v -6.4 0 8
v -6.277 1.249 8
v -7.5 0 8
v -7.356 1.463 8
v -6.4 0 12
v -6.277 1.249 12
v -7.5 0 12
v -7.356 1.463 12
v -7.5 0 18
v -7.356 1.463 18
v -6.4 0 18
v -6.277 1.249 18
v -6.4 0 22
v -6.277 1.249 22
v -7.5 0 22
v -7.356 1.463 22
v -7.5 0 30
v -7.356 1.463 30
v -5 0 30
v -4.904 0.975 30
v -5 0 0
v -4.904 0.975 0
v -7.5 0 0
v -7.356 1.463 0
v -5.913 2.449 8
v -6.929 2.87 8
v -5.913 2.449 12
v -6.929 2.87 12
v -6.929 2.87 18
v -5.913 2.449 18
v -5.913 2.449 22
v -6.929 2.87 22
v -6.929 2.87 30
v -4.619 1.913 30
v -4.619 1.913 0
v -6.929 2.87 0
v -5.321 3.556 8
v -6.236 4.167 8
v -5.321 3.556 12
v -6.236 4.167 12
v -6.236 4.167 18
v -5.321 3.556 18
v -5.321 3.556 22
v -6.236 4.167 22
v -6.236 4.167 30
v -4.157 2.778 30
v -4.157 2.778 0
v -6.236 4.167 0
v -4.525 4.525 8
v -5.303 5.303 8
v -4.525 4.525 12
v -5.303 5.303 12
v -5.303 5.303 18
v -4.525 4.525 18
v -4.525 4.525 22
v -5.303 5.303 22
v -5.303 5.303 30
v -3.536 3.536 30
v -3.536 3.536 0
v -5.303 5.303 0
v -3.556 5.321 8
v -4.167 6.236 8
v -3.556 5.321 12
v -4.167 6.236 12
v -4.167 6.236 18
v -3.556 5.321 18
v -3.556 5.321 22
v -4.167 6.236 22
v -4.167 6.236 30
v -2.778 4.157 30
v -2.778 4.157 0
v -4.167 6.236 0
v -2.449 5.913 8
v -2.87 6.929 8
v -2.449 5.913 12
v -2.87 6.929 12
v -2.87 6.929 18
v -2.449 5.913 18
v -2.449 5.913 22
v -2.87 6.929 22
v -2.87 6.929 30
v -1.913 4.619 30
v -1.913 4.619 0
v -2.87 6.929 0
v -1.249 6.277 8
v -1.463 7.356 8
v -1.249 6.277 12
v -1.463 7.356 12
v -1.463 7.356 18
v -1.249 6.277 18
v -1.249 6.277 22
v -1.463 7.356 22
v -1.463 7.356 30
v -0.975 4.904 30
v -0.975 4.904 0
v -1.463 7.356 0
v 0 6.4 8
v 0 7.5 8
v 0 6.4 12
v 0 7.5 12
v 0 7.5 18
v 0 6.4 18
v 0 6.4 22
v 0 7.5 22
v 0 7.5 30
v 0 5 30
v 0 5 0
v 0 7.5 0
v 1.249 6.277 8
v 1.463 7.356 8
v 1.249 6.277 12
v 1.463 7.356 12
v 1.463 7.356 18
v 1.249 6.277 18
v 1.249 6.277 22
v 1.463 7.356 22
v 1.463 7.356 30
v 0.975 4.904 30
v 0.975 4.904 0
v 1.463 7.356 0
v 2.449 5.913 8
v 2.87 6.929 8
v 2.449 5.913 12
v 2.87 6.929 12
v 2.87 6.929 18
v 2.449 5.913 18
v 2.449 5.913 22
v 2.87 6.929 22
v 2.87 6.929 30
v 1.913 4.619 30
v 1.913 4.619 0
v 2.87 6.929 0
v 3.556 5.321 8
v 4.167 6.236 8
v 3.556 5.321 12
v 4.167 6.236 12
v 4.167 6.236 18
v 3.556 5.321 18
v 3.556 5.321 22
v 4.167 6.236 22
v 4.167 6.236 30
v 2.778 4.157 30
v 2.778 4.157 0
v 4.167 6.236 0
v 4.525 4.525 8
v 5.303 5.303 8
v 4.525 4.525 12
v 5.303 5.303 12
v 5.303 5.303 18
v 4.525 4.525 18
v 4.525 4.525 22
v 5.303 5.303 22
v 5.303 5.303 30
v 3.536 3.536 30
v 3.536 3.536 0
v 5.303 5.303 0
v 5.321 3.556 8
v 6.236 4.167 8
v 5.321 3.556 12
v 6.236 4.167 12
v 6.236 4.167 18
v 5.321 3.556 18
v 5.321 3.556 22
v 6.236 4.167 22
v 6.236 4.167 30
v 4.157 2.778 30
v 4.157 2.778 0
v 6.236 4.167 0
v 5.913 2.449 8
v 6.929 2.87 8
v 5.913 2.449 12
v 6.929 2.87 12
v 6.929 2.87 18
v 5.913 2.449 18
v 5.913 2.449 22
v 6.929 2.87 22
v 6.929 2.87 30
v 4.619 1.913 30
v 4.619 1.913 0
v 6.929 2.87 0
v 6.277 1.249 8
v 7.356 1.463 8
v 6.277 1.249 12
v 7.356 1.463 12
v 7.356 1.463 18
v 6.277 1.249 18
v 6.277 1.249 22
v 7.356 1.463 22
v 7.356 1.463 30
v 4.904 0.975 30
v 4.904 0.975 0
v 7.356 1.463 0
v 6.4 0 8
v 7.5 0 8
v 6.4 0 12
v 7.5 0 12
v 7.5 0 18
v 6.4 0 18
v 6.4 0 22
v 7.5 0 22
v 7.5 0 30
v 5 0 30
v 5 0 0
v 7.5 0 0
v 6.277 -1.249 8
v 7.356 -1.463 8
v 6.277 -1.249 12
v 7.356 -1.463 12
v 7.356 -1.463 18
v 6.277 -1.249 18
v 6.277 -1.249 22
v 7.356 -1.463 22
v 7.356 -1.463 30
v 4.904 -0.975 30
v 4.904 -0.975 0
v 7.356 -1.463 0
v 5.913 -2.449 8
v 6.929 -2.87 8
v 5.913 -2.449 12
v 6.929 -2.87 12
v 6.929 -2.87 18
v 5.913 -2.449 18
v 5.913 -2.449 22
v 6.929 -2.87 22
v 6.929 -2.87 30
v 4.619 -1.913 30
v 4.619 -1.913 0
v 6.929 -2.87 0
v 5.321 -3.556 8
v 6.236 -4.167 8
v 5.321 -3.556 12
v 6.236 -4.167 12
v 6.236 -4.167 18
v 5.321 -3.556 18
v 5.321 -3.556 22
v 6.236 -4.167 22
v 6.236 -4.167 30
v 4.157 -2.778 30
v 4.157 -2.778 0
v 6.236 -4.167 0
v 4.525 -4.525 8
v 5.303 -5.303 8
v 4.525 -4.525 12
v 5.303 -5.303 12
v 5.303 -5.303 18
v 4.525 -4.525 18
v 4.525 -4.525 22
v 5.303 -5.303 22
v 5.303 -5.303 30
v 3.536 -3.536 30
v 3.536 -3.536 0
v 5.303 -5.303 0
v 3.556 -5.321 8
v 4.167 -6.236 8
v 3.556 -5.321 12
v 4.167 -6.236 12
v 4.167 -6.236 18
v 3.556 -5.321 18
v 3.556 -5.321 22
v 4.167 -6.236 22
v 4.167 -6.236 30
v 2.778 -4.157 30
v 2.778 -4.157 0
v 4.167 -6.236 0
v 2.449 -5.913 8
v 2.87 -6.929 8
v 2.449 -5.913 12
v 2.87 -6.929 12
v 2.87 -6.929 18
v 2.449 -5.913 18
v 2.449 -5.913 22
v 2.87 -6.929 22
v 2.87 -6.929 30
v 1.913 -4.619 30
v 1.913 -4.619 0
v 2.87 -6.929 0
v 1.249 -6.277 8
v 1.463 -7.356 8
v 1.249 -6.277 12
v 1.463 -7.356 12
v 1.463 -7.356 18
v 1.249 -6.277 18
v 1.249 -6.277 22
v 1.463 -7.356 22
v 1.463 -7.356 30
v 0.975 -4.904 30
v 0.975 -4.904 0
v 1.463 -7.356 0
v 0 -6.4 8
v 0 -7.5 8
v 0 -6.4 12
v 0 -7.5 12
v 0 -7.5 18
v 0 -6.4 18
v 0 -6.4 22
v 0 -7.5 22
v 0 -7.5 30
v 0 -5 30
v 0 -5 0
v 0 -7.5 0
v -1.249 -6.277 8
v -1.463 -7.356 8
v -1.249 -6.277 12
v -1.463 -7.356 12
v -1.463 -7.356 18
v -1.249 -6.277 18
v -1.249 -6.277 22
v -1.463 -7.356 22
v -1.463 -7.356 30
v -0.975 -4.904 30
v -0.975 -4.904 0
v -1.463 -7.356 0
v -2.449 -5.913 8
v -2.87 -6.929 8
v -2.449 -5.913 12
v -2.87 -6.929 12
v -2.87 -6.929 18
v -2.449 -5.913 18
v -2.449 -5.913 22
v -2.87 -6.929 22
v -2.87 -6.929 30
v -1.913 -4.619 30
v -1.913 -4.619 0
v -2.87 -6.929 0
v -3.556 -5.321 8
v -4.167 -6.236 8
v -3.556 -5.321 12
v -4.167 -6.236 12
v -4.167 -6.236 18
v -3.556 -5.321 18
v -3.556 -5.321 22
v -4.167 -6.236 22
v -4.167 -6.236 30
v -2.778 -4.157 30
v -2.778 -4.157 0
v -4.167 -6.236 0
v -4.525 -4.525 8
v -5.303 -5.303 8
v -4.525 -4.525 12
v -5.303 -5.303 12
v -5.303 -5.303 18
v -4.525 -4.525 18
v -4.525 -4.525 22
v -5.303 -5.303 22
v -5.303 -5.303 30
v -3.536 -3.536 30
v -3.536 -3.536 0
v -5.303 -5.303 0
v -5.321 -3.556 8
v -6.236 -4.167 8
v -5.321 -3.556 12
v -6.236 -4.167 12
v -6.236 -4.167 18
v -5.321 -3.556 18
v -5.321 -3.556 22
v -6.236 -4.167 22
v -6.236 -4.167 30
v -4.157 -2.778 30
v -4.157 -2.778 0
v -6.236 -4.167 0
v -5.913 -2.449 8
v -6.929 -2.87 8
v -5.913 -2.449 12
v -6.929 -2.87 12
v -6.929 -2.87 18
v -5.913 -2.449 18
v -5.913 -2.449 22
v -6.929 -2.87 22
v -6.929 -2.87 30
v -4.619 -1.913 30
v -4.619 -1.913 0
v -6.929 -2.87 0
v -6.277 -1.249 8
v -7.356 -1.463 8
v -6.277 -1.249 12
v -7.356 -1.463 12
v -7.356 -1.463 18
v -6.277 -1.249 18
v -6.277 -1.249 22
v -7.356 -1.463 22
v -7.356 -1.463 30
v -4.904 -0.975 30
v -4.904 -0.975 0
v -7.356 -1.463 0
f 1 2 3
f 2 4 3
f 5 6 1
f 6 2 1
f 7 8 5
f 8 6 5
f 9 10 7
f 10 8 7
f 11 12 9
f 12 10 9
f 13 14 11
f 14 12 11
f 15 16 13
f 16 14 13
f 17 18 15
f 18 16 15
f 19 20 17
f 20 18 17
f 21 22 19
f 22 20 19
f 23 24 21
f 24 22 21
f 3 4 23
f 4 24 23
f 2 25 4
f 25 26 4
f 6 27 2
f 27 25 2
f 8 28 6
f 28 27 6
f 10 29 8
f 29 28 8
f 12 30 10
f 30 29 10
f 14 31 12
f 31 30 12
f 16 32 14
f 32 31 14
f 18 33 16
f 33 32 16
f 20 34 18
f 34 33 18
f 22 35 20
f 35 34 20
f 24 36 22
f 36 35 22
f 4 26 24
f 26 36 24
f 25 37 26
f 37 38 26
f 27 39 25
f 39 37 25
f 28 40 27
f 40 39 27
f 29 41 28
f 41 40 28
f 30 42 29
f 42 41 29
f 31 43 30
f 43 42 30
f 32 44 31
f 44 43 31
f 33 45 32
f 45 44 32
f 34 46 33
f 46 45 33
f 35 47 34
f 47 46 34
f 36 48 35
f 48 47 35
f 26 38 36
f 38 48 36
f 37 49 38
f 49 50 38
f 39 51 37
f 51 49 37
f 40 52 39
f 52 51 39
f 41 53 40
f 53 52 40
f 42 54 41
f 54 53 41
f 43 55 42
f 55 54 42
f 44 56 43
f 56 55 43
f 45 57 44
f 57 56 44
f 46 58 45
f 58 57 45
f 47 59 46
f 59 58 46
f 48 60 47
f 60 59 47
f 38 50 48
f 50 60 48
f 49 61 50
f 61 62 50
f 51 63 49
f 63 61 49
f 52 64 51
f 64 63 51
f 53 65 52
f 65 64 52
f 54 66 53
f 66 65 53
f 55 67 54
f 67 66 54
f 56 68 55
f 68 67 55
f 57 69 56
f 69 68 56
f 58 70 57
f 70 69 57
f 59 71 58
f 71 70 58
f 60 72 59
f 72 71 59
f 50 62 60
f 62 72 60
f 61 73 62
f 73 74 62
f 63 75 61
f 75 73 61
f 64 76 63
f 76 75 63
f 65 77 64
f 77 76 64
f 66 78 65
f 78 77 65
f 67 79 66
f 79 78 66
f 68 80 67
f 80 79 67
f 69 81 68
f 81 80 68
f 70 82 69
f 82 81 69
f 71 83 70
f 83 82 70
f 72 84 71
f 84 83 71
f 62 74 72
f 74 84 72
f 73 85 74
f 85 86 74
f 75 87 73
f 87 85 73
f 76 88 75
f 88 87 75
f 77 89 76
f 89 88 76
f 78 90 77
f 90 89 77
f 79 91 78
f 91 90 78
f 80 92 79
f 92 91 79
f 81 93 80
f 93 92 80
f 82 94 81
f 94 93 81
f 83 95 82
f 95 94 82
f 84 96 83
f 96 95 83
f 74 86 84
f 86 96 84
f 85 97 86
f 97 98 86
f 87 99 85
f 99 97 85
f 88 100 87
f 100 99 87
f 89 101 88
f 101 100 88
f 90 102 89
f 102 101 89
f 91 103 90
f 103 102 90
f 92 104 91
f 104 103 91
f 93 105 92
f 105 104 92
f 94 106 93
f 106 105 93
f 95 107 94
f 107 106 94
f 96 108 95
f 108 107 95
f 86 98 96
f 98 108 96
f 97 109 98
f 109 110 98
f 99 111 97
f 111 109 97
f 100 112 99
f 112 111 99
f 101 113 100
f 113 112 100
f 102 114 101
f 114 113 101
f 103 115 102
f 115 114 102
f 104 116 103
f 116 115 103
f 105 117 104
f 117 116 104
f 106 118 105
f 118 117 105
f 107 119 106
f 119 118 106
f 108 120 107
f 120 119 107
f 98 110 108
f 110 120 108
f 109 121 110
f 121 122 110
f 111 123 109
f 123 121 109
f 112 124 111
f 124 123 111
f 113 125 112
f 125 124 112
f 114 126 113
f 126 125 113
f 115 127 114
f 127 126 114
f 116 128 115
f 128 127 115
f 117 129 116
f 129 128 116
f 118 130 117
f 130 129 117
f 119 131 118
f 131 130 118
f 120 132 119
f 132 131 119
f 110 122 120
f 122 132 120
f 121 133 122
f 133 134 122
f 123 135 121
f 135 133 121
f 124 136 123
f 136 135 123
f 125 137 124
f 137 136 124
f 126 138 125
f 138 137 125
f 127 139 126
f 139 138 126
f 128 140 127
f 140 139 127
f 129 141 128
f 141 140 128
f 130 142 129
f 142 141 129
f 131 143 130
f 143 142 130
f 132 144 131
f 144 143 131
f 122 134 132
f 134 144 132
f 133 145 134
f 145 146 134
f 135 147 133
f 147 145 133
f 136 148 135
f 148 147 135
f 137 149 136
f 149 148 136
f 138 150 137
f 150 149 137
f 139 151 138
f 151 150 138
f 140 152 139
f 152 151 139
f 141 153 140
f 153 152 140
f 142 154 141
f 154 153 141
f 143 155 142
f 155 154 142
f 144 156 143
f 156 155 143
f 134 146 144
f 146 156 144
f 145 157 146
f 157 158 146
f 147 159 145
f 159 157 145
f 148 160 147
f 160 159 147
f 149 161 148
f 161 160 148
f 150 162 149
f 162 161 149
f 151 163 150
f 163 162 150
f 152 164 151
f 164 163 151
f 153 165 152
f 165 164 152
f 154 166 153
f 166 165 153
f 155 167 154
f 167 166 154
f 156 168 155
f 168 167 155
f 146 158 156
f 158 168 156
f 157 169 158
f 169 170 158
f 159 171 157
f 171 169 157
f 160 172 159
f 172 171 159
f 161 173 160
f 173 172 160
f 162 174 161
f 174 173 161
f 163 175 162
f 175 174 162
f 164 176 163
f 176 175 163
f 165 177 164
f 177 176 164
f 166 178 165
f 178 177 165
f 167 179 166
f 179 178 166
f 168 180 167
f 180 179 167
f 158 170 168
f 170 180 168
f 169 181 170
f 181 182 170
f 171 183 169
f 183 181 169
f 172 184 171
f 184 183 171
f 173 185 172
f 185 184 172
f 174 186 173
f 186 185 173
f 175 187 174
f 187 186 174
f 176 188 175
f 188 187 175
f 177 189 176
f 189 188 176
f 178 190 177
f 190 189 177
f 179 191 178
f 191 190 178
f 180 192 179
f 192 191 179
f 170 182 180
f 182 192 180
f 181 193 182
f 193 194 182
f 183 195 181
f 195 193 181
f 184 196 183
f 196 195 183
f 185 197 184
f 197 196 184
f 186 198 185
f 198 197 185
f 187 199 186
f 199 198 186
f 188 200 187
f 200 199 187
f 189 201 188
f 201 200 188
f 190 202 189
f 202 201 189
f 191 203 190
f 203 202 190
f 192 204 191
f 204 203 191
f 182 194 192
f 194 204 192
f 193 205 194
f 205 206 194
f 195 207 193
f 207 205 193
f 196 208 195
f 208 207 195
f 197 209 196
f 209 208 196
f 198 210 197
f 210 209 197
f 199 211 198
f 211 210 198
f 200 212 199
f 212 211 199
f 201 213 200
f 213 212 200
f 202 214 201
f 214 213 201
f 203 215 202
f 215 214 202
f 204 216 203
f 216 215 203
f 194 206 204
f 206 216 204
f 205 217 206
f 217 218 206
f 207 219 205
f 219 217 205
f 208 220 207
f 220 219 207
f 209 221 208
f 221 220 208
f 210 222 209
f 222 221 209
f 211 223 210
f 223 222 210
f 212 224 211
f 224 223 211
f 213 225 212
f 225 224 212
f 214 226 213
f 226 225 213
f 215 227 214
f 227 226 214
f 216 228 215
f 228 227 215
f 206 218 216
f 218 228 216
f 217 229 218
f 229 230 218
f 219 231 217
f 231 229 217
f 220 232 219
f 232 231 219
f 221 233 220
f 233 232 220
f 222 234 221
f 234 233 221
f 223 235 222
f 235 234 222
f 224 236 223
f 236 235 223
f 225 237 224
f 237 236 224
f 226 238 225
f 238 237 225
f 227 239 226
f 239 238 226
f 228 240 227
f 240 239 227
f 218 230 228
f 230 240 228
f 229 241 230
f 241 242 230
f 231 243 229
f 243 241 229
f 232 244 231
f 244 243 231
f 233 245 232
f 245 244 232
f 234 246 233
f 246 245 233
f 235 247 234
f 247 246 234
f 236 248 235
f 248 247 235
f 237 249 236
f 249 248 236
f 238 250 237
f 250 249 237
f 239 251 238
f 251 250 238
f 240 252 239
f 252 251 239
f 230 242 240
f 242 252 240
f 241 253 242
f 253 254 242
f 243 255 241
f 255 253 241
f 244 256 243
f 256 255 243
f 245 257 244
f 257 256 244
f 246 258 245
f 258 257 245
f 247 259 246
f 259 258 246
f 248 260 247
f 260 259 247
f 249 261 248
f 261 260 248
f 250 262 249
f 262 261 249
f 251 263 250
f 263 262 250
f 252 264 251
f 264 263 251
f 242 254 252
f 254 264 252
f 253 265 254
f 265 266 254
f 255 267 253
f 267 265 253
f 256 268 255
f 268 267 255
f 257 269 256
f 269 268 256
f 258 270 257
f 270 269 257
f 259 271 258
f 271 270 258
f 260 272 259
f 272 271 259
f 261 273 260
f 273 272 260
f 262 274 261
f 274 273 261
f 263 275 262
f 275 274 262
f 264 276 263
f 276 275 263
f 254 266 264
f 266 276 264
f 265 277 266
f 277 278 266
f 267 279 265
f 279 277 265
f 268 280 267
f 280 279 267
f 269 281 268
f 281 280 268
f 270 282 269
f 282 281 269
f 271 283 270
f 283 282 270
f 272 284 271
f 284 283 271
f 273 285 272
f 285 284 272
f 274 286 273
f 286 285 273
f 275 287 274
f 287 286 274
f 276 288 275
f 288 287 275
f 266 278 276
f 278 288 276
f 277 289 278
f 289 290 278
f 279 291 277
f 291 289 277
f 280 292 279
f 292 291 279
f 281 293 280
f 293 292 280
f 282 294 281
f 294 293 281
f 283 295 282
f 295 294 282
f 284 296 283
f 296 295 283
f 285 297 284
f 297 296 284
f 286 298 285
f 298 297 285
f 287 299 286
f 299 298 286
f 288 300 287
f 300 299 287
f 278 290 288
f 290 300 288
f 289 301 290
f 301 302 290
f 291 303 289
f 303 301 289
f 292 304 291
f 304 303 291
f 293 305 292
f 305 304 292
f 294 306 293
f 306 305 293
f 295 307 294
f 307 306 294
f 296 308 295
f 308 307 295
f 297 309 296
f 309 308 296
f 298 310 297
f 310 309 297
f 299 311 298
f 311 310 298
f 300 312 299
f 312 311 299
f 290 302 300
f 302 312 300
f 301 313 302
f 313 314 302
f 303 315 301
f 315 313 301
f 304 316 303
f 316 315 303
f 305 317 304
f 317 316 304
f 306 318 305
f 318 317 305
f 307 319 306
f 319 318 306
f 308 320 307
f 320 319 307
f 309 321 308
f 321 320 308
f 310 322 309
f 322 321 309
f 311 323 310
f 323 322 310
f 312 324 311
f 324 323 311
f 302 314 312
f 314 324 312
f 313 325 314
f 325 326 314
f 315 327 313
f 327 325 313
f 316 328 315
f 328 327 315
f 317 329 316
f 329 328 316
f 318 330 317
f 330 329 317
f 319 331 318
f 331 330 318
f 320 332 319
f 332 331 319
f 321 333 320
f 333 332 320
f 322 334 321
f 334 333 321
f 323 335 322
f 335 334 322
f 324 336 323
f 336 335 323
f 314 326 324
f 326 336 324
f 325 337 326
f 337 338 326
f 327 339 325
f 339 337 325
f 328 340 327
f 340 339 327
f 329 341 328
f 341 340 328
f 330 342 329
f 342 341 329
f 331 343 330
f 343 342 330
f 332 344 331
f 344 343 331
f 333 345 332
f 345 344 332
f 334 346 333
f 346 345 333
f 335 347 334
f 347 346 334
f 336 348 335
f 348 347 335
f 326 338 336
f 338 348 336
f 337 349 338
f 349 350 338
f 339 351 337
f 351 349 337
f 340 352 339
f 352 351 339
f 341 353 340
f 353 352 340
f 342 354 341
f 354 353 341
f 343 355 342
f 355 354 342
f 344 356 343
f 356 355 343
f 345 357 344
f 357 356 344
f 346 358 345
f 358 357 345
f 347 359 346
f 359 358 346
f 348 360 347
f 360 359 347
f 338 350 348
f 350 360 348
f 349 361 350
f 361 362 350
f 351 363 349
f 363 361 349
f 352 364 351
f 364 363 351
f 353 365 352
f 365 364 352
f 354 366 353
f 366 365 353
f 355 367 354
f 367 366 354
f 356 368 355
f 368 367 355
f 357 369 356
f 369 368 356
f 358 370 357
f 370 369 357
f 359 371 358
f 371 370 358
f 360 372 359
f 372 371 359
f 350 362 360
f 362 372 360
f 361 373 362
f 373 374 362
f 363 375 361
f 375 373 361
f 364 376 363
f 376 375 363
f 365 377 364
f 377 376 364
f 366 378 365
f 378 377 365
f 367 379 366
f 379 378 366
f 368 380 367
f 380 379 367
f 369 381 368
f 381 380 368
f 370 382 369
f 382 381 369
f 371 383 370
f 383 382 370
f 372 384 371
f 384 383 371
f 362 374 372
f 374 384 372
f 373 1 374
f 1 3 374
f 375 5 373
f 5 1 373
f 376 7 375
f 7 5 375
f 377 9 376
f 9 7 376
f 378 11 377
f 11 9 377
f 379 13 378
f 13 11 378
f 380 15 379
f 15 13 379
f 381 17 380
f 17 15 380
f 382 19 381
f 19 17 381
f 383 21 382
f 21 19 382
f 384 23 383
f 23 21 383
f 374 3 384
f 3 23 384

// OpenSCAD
$fn = 32;

// ----------------------------------------------------------------------
// Grooved revolve: plain_grooves, bore R5
// ----------------------------------------------------------------------

// --- parameters (mm) ---
bore_r = 5;               // bore radius
outer_r = 7.5;            // outer radius of the body
total_h = 30;             // overall height, Z
wall = 2.5;               // radial wall thickness
groove_w = 4;             // groove width
groove_d = 1.1;           // groove depth
grooves = 2;              // number of outer grooves
fit_tol = 0.1;            // declared fit tolerance (prompt contract)
free_tol = 0.3;           // declared free tolerance (prompt contract)

bbox_x = 2 * outer_r;  // full diameter
bore_d = 2 * bore_r;  // bore diameter
body_d = 2 * outer_r;  // body diameter
revolve_angle = 360;  // full turn around the Z axis

profile = [[5, 0], [7.5, 0], [7.5, 8], [6.4, 8], [6.4, 12], [7.5, 12], [7.5, 18], [6.4, 18], [6.4, 22], [7.5, 22], [7.5, 30], [5, 30]];  // primary outline, 12 points, counter clockwise

// --- the one profile operation ---
rotate_extrude(angle = revolve_angle) polygon(points = profile);
